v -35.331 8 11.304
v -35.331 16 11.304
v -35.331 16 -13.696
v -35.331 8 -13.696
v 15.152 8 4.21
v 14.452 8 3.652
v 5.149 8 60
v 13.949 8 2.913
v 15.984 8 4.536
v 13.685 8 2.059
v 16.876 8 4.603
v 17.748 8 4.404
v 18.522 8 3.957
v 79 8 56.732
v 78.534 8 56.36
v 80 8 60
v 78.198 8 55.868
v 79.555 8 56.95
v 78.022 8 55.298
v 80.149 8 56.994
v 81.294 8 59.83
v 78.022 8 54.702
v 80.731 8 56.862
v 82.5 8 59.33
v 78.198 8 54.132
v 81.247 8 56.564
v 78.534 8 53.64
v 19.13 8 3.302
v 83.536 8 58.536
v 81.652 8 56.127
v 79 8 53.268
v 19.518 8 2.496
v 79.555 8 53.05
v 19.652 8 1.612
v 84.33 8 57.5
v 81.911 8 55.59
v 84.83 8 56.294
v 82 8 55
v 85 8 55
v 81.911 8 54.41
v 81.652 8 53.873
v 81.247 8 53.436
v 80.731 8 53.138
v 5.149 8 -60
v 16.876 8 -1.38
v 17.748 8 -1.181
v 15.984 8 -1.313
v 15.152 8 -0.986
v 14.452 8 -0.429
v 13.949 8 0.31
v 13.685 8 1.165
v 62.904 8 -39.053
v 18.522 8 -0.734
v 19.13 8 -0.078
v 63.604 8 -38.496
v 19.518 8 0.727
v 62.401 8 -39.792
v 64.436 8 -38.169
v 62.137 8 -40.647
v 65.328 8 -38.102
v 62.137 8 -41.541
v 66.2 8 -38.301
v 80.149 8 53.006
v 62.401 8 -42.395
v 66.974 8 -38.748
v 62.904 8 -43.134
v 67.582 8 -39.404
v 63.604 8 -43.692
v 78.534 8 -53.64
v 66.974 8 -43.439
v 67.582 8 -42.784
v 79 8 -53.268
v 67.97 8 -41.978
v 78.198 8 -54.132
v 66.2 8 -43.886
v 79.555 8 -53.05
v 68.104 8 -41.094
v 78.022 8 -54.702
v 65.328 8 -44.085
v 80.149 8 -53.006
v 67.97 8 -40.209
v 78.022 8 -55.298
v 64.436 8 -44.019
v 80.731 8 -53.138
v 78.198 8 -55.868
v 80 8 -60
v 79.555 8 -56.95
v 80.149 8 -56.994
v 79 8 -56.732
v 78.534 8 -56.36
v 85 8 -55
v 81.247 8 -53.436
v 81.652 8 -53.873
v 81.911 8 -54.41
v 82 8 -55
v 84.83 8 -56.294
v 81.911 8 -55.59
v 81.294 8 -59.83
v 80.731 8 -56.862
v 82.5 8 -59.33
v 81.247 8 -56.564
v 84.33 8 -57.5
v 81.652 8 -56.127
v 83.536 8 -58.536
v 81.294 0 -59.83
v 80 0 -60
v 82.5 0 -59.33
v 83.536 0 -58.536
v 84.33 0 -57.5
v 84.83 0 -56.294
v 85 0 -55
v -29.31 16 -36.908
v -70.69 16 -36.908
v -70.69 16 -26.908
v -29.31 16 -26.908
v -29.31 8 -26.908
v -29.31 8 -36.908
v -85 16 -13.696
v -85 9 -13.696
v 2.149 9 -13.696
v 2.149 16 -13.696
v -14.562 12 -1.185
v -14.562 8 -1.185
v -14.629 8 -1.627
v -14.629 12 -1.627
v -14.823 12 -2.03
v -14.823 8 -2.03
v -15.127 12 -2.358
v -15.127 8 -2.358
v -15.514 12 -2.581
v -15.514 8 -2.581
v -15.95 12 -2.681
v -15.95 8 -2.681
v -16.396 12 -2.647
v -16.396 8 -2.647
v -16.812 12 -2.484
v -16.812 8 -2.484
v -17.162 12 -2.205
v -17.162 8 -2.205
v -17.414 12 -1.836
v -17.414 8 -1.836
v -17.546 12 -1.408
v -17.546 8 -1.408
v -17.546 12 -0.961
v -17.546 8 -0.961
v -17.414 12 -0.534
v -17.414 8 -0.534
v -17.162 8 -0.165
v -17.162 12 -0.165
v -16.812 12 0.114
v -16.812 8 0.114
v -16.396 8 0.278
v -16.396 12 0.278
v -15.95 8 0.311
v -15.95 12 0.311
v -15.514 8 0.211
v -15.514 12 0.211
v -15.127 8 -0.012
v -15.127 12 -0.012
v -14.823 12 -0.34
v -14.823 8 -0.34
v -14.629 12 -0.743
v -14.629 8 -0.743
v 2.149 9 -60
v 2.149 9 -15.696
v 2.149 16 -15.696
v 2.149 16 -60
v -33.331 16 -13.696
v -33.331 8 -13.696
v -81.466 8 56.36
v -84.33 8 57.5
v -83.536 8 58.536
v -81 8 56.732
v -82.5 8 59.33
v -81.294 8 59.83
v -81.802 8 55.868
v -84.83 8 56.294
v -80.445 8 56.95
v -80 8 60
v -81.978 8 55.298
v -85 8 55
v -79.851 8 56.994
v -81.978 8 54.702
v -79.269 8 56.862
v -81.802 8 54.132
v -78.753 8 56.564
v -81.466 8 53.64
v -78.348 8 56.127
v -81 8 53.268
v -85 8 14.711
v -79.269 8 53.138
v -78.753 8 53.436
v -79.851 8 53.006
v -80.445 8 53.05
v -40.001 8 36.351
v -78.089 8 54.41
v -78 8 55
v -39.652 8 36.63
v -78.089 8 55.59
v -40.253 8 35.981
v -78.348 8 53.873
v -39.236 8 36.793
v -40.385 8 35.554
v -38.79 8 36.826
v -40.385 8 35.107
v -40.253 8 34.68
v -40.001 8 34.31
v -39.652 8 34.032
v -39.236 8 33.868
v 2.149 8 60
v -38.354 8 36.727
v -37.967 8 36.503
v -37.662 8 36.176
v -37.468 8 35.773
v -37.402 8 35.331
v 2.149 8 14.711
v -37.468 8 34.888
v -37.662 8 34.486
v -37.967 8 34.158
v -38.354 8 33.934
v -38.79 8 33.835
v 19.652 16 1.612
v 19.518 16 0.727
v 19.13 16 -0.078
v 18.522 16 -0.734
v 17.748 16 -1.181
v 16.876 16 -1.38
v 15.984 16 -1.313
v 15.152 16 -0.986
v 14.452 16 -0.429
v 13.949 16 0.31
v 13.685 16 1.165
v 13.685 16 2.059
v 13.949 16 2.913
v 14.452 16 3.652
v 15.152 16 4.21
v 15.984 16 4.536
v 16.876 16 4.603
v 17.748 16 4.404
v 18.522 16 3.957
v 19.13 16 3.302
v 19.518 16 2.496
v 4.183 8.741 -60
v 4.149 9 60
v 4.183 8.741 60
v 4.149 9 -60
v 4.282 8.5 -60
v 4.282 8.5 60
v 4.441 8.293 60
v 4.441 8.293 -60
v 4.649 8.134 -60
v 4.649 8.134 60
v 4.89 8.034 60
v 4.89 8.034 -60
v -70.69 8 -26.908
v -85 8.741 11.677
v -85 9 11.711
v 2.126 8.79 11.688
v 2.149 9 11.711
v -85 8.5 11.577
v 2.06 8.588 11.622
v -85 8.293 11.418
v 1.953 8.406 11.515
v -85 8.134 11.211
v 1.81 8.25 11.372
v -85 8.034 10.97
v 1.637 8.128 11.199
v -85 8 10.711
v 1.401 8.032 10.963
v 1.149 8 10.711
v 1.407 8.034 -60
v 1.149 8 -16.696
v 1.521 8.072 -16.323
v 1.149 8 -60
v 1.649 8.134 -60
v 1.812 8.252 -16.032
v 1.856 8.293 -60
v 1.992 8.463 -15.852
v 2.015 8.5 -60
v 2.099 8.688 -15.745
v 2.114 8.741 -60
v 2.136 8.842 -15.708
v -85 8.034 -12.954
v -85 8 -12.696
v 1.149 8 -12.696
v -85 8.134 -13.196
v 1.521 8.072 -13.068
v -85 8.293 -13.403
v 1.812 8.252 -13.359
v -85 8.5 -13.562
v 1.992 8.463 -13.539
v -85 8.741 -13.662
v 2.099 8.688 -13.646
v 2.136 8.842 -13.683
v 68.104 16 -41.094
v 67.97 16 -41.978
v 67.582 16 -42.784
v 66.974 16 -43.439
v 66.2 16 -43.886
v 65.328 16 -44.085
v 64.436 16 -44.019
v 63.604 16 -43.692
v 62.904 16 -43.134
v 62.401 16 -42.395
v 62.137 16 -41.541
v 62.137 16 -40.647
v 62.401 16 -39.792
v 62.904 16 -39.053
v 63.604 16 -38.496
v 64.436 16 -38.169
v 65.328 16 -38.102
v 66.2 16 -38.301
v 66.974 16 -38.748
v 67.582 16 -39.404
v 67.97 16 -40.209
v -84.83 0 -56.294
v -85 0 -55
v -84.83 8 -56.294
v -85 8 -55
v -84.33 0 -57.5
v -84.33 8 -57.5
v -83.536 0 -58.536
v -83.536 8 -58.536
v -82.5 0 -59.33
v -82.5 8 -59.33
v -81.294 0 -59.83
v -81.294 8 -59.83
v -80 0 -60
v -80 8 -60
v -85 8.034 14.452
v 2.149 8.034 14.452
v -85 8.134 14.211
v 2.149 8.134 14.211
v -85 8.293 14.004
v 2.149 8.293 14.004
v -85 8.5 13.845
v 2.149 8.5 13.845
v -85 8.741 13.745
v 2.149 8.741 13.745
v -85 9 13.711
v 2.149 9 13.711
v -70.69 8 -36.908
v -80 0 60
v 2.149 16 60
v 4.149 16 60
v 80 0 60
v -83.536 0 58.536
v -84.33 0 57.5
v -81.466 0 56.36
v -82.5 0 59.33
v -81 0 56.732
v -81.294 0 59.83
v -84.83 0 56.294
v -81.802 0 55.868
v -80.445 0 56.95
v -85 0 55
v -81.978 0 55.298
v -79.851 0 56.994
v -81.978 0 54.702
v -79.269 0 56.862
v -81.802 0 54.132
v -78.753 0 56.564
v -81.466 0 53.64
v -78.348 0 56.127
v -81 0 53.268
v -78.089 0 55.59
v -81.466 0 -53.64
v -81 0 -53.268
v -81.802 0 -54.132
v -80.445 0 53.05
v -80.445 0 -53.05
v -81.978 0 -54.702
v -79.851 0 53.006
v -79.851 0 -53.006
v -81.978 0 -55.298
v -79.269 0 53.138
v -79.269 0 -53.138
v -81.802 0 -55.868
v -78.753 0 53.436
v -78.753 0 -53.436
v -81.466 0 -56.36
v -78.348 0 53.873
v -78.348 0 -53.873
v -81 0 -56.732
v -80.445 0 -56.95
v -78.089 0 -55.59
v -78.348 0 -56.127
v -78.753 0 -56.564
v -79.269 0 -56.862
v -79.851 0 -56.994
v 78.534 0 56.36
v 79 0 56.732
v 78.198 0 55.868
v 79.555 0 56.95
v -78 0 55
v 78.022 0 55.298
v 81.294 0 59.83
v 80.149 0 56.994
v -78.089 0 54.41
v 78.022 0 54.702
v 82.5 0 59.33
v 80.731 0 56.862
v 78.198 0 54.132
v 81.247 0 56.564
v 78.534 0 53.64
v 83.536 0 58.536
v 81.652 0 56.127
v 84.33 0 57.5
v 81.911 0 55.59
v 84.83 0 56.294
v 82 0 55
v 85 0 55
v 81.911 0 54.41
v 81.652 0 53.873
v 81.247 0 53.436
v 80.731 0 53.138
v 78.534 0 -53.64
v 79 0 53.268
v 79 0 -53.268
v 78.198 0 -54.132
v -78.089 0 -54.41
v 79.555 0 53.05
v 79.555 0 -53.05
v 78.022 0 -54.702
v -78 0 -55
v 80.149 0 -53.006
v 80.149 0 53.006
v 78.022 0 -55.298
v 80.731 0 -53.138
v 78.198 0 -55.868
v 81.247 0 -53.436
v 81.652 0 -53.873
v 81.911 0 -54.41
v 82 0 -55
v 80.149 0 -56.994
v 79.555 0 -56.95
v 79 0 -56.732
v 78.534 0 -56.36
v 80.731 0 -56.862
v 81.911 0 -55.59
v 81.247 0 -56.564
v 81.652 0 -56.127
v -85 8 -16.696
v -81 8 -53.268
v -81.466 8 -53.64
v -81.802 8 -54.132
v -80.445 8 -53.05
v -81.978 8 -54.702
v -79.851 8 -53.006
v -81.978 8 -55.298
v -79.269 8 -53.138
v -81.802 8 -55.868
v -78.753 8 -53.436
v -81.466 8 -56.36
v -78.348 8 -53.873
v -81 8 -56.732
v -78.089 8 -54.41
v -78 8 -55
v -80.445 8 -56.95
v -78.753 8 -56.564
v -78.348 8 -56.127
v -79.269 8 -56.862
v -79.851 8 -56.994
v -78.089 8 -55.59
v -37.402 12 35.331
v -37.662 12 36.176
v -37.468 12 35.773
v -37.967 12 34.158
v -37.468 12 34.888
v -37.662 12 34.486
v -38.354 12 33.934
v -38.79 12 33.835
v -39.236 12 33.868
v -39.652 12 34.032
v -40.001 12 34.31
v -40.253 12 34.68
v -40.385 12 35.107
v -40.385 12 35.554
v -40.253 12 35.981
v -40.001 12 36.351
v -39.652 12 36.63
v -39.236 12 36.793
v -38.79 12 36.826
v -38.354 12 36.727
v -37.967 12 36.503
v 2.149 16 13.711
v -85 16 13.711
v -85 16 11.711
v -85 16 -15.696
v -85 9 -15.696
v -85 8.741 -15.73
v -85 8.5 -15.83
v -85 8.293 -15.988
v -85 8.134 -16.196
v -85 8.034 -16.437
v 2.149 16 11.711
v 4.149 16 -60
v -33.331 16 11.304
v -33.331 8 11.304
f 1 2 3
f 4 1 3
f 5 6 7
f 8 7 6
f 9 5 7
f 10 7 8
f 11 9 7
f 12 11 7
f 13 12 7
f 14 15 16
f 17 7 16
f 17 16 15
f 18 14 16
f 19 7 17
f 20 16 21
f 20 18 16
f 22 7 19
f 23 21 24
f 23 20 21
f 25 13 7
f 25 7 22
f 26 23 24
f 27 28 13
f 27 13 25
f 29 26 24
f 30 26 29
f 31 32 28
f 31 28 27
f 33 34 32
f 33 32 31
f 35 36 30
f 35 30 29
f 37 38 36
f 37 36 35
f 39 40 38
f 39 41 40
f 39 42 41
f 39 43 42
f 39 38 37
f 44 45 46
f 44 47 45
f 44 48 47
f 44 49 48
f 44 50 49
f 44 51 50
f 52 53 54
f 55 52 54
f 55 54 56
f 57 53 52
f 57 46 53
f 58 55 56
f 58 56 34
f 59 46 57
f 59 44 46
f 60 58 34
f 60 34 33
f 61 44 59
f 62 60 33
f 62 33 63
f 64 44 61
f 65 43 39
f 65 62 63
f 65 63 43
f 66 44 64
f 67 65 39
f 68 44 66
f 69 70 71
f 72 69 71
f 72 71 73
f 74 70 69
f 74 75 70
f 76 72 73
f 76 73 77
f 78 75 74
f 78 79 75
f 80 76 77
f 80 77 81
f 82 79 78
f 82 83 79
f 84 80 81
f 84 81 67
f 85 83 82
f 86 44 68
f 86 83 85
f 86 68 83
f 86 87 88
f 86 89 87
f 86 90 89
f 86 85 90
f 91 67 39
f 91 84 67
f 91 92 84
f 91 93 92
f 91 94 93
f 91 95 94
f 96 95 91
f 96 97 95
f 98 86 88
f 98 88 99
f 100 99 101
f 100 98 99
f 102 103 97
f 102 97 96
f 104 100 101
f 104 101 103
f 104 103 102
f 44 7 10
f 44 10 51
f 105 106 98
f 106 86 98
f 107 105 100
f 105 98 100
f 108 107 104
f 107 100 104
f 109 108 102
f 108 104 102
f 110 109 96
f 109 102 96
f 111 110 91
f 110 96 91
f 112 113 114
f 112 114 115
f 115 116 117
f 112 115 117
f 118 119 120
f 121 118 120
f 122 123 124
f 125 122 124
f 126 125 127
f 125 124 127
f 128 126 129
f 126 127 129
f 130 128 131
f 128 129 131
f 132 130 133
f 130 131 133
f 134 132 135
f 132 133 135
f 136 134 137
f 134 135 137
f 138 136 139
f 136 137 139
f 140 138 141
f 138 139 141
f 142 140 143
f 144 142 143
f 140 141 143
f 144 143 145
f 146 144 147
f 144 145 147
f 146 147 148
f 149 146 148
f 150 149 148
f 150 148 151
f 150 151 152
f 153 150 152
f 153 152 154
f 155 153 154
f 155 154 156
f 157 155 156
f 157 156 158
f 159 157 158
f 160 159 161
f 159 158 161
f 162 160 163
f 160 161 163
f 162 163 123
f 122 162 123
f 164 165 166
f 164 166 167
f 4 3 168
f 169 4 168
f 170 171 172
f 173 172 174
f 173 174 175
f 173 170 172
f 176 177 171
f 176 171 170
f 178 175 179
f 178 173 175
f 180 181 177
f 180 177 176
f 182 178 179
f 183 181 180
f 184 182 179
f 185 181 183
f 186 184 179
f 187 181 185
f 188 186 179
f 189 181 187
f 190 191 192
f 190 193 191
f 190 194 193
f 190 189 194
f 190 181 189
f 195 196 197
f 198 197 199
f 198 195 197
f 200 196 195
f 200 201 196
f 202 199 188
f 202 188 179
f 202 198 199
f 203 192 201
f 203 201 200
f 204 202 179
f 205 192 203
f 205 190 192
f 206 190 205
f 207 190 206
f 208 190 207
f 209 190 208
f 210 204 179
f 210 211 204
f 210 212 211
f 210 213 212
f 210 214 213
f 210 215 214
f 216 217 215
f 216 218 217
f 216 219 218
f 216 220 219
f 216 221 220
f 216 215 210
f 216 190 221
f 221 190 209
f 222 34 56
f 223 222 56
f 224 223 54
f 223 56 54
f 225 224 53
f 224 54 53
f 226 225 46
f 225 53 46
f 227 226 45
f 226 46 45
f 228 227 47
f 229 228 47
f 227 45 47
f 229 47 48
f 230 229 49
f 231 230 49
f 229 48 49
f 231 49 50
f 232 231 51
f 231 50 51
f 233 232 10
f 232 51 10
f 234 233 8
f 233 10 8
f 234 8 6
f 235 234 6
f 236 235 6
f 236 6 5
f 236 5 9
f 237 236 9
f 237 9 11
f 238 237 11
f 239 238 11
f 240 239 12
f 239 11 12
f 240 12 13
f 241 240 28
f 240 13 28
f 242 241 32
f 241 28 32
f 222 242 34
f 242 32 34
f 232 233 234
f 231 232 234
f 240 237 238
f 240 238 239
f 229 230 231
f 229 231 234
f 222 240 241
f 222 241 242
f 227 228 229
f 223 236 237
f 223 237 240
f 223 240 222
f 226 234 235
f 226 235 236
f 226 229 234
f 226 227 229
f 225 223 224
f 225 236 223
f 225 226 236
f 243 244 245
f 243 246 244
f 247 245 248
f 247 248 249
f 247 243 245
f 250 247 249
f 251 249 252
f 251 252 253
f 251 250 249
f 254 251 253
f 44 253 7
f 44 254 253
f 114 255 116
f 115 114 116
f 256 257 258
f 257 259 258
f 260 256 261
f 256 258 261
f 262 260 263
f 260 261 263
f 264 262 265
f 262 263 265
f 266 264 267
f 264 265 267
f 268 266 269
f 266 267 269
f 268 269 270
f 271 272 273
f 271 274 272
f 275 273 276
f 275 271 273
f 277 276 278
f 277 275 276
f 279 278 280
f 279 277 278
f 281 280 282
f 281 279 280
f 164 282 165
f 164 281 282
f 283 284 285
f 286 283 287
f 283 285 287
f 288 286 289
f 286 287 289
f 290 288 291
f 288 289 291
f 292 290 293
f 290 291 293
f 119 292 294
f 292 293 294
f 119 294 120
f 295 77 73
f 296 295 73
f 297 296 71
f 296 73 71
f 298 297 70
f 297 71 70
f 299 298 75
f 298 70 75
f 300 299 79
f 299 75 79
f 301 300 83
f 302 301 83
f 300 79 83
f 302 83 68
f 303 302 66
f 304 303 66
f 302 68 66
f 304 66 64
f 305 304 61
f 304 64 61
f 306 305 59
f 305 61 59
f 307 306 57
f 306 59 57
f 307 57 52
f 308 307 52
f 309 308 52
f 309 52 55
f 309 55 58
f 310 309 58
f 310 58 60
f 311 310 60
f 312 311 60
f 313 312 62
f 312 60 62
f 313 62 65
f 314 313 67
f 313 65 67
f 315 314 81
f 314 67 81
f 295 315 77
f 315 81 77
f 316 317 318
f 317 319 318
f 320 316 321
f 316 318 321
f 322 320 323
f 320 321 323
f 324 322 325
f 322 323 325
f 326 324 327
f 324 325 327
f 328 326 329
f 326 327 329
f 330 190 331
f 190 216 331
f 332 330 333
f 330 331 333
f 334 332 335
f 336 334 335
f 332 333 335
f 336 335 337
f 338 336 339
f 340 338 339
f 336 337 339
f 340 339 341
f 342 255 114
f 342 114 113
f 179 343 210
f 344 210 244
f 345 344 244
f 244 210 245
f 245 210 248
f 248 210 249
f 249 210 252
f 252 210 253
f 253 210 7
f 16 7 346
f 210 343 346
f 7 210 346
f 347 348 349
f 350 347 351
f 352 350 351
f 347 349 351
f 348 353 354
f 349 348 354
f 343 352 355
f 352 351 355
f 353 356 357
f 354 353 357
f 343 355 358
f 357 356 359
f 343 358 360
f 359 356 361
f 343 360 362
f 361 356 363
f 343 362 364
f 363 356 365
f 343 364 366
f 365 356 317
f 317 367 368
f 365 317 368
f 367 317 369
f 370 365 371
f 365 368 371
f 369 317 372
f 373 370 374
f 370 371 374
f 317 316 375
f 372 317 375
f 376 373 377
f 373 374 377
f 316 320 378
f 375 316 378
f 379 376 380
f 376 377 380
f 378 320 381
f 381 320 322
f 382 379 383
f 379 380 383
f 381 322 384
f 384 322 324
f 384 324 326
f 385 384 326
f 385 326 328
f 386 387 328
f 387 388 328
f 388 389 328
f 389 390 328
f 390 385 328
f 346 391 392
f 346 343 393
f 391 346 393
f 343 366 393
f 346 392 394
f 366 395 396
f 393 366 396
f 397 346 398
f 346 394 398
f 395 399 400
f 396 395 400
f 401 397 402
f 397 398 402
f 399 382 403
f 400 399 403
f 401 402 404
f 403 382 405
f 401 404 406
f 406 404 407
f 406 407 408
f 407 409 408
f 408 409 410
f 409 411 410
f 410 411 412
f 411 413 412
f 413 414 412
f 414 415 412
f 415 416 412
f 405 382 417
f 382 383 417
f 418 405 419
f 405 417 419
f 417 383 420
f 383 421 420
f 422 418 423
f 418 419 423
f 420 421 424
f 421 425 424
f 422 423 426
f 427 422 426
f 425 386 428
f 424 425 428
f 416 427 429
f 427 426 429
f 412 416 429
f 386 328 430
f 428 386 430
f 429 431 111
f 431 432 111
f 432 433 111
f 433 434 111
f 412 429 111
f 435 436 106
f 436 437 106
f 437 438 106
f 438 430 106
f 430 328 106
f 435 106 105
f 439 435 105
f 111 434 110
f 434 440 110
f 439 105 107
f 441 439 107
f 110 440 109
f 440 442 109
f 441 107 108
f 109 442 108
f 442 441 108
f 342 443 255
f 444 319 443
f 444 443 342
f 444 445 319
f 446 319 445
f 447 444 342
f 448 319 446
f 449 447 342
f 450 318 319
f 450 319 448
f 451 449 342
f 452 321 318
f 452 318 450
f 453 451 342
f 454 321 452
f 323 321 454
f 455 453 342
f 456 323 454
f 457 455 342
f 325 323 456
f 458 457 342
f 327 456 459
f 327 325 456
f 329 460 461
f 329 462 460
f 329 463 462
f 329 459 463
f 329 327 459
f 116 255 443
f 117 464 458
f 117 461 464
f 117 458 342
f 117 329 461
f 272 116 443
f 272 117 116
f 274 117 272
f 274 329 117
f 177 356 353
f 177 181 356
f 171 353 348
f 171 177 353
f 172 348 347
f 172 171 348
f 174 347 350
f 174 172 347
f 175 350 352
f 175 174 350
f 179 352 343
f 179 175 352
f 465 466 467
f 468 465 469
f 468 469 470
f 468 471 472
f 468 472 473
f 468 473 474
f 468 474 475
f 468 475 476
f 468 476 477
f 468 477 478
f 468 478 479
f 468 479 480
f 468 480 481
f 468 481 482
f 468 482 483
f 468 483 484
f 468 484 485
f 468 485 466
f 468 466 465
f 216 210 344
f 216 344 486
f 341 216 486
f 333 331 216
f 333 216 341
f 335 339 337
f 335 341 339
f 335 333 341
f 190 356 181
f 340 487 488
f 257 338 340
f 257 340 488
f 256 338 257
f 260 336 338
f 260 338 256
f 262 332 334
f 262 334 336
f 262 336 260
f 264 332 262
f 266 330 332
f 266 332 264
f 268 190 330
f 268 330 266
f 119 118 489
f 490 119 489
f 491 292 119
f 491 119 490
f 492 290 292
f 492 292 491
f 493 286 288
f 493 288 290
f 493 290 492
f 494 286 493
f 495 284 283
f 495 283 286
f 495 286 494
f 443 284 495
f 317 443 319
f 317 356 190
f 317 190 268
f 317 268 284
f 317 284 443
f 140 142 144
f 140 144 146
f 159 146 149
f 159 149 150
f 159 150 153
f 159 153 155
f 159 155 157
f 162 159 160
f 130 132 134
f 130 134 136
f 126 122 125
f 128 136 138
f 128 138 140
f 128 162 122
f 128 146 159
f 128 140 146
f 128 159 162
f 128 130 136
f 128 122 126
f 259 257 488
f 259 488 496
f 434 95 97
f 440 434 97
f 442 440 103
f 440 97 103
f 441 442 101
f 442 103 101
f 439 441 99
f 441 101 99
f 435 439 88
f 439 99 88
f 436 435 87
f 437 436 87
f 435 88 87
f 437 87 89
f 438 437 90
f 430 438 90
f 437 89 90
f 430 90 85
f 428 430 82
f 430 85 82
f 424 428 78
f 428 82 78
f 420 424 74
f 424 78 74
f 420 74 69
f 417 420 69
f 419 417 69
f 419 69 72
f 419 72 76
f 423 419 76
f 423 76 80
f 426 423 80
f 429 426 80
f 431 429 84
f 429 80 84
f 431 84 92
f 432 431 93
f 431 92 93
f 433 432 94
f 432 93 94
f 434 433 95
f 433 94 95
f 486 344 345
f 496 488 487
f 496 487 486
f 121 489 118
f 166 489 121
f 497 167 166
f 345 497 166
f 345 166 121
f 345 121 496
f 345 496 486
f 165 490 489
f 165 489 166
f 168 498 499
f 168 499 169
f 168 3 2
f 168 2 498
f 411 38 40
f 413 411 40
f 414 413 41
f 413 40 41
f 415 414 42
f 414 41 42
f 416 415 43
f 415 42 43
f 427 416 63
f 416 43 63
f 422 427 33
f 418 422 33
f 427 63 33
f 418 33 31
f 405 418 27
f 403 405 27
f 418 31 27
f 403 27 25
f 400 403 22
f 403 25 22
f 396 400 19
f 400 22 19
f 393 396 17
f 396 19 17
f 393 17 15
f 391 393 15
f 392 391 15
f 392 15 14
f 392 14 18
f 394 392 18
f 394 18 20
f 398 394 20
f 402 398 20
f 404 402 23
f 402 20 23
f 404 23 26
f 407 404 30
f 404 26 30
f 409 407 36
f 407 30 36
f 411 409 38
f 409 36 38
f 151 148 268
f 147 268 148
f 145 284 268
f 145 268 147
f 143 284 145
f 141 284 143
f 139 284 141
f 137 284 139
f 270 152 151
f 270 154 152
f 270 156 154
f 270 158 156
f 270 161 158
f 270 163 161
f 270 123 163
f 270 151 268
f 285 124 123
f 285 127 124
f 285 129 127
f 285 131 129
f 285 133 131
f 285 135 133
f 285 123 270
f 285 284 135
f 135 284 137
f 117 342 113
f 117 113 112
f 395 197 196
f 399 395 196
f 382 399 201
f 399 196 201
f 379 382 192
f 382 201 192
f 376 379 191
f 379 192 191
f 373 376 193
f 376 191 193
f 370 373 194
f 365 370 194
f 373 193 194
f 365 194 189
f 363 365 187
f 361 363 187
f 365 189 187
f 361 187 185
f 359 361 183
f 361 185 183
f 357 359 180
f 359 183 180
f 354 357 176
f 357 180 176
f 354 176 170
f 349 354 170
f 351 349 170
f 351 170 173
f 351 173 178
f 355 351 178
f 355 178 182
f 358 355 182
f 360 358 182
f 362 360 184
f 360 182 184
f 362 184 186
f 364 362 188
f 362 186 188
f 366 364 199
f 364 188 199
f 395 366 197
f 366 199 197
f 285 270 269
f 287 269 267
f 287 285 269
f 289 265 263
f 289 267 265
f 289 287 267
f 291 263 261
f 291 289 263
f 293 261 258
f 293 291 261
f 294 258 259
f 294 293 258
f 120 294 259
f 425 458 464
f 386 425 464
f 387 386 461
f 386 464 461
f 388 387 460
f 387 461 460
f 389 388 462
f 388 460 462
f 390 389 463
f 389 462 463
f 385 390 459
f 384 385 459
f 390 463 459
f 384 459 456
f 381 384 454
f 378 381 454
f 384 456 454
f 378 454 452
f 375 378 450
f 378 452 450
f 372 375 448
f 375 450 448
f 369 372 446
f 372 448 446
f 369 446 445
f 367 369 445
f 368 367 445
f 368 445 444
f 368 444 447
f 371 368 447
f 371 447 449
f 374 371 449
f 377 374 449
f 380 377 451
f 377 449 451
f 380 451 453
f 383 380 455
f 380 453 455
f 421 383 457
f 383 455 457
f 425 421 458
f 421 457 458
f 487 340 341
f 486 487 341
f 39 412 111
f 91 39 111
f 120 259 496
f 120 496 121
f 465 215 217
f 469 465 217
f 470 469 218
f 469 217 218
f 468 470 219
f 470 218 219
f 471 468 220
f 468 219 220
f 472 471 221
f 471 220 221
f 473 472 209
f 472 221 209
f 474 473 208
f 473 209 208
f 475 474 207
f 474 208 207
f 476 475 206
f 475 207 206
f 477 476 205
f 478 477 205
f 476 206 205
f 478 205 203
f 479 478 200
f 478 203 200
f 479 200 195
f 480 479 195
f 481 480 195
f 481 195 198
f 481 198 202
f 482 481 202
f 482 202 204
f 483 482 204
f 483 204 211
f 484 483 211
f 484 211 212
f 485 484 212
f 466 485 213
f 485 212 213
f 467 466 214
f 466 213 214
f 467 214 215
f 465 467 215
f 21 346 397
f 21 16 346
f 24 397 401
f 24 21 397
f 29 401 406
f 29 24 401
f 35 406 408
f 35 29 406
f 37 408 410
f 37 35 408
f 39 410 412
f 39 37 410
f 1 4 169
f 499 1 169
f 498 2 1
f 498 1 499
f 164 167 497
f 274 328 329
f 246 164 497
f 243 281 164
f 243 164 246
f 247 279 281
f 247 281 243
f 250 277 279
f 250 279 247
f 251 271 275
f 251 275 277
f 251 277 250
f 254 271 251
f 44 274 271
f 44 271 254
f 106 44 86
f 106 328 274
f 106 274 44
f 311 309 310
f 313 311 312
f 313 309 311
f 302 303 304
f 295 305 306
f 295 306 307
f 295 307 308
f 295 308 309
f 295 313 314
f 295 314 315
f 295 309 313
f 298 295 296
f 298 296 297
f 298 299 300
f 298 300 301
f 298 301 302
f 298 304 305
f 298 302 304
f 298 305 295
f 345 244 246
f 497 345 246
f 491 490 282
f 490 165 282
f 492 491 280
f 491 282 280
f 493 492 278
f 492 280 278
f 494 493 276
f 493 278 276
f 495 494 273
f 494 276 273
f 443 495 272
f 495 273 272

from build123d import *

# Parameters (mm, degrees)
SKETCH1_W            = 170
SKETCH1_H            = 120
BOSS_EXTRUDE1_DEPTH  = 8
SKETCH2_W            = 41.380626675
SKETCH2_H            = 10
BOSS_EXTRUDE2_DEPTH  = 8
SKETCH3_R            = 2
CUT_EXTRUDE1_DEPTH   = 8
SKETCH7_R            = 3
BOSS_EXTRUDE3_DEPTH  = 8
SKETCH8_R            = 1.5
BOSS_EXTRUDE6_DEPTH  = 4
SKETCH9_R            = 1.5
BOSS_EXTRUDE7_DEPTH  = 4
SKETCH10_R           = 3
BOSS_EXTRUDE8_DEPTH  = 8
SKETCH11_W           = 2
SKETCH11_H           = 120
BOSS_EXTRUDE9_DEPTH  = 8
SKETCH13_W           = 87.148503305
SKETCH13_H           = 2
BOSS_EXTRUDE10_DEPTH = 8
BOSS_EXTRUDE11_START = -1.289738394
SKETCH7_3_R          = 3
BOSS_EXTRUDE11_DEPTH = 1.289738394
SKETCH14_W           = 2
SKETCH14_H           = 25
BOSS_EXTRUDE13_DEPTH = 8
SKETCH18_W           = 87.148503305
SKETCH18_H           = 2
BOSS_EXTRUDE16_DEPTH = 8
SKETCH19_R           = 1.5
BOSS_EXTRUDE17_DEPTH = 4
FILLET1_R            = 1
FILLET6_R            = 5


with BuildPart() as part:
    # Sketch1 → Boss-Extrude1 (new body)
    with BuildSketch(Plane(origin=(0, 0, 0), x_dir=(1, 0, 0), z_dir=(0, 1, 0))):
        Rectangle(SKETCH1_W, SKETCH1_H)
    extrude(amount=BOSS_EXTRUDE1_DEPTH)

    # Sketch2 → Boss-Extrude2 (add)
    with BuildSketch(Plane(origin=(-17.791513114, 8, -3.068036611), x_dir=(1, 0, 0), z_dir=(0, 1, 0))):
        with Locations((-32.208486886, 28.840032215)):
            Rectangle(SKETCH2_W, SKETCH2_H)
    extrude(amount=BOSS_EXTRUDE2_DEPTH)

    # Sketch3 → Cut-Extrude1 (cut)
    with BuildSketch(Plane(origin=(0, 8, 0), x_dir=(1, 0, 0), z_dir=(0, 1, 0))):
        with Locations((-80, 55)):
            Circle(SKETCH3_R)
        with Locations((-80, -55)):
            Circle(SKETCH3_R)
        with Locations((80, 55)):
            Circle(SKETCH3_R)
        with Locations((80, -55)):
            Circle(SKETCH3_R)
    extrude(amount=-CUT_EXTRUDE1_DEPTH, mode=Mode.SUBTRACT)

    # Sketch7 → Boss-Extrude3 (add)
    with BuildSketch(Plane(origin=(12.703147983, 8, 3.565766466), x_dir=(1, 0, 0), z_dir=(0, 1, 0))):
        with Locations((52.400485428, 44.659504627)):
            Circle(SKETCH7_R)
    extrude(amount=BOSS_EXTRUDE3_DEPTH)

    # Sketch8 → Boss-Extrude6 (add)
    with BuildSketch(Plane(origin=(0, 16, 3.565766466), x_dir=(1, 0, 0), z_dir=(0, 1, 0))):
        with Locations((65.103633411, 44.659504627)):
            Circle(SKETCH8_R)
    extrude(amount=-BOSS_EXTRUDE6_DEPTH)

    # Sketch9 → Boss-Extrude7 (add)
    with BuildSketch(Plane(origin=(0, 16, 3.565766466), x_dir=(1, 0, 0), z_dir=(0, 1, 0))):
        with Locations((64.905146724, 44.273718651)):
            Circle(SKETCH9_R)
    extrude(amount=-BOSS_EXTRUDE7_DEPTH)

    # Sketch10 → Boss-Extrude8 (add)
    with BuildSketch(Plane(origin=(-8.754663217, 8, 20.46794397), x_dir=(1, 0, 0), z_dir=(0, 1, 0))):
        with Locations((25.406295965, 18.856235287)):
            Circle(SKETCH10_R)
    extrude(amount=BOSS_EXTRUDE8_DEPTH)

    # Sketch11 → Boss-Extrude9 (add)
    with BuildSketch(Plane(origin=(4.148503305, 8, 0), x_dir=(1, 0, 0), z_dir=(0, 1, 0))):
        with Locations((-1, 0)):
            Rectangle(SKETCH11_W, SKETCH11_H)
    extrude(amount=BOSS_EXTRUDE9_DEPTH)

    # Sketch13 → Boss-Extrude10 (add)
    with BuildSketch(Plane(origin=(0, 8, 0), x_dir=(1, 0, 0), z_dir=(0, 1, 0))):
        with Locations((-41.425748347, 14.695581419)):
            Rectangle(SKETCH13_W, SKETCH13_H)
    extrude(amount=BOSS_EXTRUDE10_DEPTH)

    # Sketch7<3> → Boss-Extrude11 (add)
    with BuildSketch(Plane(origin=(12.703147983, 8, 3.565766466), x_dir=(1, 0, 0), z_dir=(0, 1, 0)).offset(BOSS_EXTRUDE11_START)):
        with Locations((52.400485428, 44.659504627)):
            Circle(SKETCH7_3_R)
    extrude(amount=BOSS_EXTRUDE11_DEPTH)

    # Sketch18 → Boss-Extrude16 (add)
    with BuildSketch(Plane(origin=(0, 8, 0), x_dir=(1, 0, 0), z_dir=(0, 1, 0))):
        with Locations((-41.425748347, -12.710714547)):
            Rectangle(SKETCH18_W, SKETCH18_H)
    extrude(amount=BOSS_EXTRUDE16_DEPTH)

    # Sketch19 → Boss-Extrude17 (add)
    with BuildSketch(Plane(origin=(0, 8, 0), x_dir=(1, 0, 0), z_dir=(0, 1, 0))):
        with Locations((-16.06228854, 1.18486687)):
            Circle(SKETCH19_R)
        with Locations((-38.901806458, -35.330630327)):
            Circle(SKETCH19_R)
    extrude(amount=BOSS_EXTRUDE17_DEPTH)

    # Fillet1
    fillet1_edges = [part.edges().sort_by_distance(p)[0] for p in [
        (-41.425748348, 8, 13.710714547),
        (-41.425748348, 8, 11.710714547),
        (-41.425748348, 8, -13.695581419),
        (2.148503305, 8, -0.992433436),
        (4.148503305, 8, 0),
        (2.148503305, 8, -37.847790709),
        (-41.425748348, 8, -15.695581419),
    ]]
    fillet(fillet1_edges, radius=FILLET1_R)

    # Fillet6
    fillet6_edges = [part.edges().sort_by_distance(p)[0] for p in [
        (85, 4, -60),
        (85, 4, 60),
        (-85, 4, 60),
        (-85, 4, -60),
    ]]
    fillet(fillet6_edges, radius=FILLET6_R)


with BuildPart() as body_2:
    # Sketch14 → Boss-Extrude13 (new body)
    with BuildSketch(Plane(origin=(0, 16, 0), x_dir=(1, 0, 0), z_dir=(0, 1, 0))):
        with Locations((-34.330630327, 1.195581419)):
            Rectangle(SKETCH14_W, SKETCH14_H)
    extrude(amount=-BOSS_EXTRUDE13_DEPTH)


solid = Compound([part.part, body_2.part])
